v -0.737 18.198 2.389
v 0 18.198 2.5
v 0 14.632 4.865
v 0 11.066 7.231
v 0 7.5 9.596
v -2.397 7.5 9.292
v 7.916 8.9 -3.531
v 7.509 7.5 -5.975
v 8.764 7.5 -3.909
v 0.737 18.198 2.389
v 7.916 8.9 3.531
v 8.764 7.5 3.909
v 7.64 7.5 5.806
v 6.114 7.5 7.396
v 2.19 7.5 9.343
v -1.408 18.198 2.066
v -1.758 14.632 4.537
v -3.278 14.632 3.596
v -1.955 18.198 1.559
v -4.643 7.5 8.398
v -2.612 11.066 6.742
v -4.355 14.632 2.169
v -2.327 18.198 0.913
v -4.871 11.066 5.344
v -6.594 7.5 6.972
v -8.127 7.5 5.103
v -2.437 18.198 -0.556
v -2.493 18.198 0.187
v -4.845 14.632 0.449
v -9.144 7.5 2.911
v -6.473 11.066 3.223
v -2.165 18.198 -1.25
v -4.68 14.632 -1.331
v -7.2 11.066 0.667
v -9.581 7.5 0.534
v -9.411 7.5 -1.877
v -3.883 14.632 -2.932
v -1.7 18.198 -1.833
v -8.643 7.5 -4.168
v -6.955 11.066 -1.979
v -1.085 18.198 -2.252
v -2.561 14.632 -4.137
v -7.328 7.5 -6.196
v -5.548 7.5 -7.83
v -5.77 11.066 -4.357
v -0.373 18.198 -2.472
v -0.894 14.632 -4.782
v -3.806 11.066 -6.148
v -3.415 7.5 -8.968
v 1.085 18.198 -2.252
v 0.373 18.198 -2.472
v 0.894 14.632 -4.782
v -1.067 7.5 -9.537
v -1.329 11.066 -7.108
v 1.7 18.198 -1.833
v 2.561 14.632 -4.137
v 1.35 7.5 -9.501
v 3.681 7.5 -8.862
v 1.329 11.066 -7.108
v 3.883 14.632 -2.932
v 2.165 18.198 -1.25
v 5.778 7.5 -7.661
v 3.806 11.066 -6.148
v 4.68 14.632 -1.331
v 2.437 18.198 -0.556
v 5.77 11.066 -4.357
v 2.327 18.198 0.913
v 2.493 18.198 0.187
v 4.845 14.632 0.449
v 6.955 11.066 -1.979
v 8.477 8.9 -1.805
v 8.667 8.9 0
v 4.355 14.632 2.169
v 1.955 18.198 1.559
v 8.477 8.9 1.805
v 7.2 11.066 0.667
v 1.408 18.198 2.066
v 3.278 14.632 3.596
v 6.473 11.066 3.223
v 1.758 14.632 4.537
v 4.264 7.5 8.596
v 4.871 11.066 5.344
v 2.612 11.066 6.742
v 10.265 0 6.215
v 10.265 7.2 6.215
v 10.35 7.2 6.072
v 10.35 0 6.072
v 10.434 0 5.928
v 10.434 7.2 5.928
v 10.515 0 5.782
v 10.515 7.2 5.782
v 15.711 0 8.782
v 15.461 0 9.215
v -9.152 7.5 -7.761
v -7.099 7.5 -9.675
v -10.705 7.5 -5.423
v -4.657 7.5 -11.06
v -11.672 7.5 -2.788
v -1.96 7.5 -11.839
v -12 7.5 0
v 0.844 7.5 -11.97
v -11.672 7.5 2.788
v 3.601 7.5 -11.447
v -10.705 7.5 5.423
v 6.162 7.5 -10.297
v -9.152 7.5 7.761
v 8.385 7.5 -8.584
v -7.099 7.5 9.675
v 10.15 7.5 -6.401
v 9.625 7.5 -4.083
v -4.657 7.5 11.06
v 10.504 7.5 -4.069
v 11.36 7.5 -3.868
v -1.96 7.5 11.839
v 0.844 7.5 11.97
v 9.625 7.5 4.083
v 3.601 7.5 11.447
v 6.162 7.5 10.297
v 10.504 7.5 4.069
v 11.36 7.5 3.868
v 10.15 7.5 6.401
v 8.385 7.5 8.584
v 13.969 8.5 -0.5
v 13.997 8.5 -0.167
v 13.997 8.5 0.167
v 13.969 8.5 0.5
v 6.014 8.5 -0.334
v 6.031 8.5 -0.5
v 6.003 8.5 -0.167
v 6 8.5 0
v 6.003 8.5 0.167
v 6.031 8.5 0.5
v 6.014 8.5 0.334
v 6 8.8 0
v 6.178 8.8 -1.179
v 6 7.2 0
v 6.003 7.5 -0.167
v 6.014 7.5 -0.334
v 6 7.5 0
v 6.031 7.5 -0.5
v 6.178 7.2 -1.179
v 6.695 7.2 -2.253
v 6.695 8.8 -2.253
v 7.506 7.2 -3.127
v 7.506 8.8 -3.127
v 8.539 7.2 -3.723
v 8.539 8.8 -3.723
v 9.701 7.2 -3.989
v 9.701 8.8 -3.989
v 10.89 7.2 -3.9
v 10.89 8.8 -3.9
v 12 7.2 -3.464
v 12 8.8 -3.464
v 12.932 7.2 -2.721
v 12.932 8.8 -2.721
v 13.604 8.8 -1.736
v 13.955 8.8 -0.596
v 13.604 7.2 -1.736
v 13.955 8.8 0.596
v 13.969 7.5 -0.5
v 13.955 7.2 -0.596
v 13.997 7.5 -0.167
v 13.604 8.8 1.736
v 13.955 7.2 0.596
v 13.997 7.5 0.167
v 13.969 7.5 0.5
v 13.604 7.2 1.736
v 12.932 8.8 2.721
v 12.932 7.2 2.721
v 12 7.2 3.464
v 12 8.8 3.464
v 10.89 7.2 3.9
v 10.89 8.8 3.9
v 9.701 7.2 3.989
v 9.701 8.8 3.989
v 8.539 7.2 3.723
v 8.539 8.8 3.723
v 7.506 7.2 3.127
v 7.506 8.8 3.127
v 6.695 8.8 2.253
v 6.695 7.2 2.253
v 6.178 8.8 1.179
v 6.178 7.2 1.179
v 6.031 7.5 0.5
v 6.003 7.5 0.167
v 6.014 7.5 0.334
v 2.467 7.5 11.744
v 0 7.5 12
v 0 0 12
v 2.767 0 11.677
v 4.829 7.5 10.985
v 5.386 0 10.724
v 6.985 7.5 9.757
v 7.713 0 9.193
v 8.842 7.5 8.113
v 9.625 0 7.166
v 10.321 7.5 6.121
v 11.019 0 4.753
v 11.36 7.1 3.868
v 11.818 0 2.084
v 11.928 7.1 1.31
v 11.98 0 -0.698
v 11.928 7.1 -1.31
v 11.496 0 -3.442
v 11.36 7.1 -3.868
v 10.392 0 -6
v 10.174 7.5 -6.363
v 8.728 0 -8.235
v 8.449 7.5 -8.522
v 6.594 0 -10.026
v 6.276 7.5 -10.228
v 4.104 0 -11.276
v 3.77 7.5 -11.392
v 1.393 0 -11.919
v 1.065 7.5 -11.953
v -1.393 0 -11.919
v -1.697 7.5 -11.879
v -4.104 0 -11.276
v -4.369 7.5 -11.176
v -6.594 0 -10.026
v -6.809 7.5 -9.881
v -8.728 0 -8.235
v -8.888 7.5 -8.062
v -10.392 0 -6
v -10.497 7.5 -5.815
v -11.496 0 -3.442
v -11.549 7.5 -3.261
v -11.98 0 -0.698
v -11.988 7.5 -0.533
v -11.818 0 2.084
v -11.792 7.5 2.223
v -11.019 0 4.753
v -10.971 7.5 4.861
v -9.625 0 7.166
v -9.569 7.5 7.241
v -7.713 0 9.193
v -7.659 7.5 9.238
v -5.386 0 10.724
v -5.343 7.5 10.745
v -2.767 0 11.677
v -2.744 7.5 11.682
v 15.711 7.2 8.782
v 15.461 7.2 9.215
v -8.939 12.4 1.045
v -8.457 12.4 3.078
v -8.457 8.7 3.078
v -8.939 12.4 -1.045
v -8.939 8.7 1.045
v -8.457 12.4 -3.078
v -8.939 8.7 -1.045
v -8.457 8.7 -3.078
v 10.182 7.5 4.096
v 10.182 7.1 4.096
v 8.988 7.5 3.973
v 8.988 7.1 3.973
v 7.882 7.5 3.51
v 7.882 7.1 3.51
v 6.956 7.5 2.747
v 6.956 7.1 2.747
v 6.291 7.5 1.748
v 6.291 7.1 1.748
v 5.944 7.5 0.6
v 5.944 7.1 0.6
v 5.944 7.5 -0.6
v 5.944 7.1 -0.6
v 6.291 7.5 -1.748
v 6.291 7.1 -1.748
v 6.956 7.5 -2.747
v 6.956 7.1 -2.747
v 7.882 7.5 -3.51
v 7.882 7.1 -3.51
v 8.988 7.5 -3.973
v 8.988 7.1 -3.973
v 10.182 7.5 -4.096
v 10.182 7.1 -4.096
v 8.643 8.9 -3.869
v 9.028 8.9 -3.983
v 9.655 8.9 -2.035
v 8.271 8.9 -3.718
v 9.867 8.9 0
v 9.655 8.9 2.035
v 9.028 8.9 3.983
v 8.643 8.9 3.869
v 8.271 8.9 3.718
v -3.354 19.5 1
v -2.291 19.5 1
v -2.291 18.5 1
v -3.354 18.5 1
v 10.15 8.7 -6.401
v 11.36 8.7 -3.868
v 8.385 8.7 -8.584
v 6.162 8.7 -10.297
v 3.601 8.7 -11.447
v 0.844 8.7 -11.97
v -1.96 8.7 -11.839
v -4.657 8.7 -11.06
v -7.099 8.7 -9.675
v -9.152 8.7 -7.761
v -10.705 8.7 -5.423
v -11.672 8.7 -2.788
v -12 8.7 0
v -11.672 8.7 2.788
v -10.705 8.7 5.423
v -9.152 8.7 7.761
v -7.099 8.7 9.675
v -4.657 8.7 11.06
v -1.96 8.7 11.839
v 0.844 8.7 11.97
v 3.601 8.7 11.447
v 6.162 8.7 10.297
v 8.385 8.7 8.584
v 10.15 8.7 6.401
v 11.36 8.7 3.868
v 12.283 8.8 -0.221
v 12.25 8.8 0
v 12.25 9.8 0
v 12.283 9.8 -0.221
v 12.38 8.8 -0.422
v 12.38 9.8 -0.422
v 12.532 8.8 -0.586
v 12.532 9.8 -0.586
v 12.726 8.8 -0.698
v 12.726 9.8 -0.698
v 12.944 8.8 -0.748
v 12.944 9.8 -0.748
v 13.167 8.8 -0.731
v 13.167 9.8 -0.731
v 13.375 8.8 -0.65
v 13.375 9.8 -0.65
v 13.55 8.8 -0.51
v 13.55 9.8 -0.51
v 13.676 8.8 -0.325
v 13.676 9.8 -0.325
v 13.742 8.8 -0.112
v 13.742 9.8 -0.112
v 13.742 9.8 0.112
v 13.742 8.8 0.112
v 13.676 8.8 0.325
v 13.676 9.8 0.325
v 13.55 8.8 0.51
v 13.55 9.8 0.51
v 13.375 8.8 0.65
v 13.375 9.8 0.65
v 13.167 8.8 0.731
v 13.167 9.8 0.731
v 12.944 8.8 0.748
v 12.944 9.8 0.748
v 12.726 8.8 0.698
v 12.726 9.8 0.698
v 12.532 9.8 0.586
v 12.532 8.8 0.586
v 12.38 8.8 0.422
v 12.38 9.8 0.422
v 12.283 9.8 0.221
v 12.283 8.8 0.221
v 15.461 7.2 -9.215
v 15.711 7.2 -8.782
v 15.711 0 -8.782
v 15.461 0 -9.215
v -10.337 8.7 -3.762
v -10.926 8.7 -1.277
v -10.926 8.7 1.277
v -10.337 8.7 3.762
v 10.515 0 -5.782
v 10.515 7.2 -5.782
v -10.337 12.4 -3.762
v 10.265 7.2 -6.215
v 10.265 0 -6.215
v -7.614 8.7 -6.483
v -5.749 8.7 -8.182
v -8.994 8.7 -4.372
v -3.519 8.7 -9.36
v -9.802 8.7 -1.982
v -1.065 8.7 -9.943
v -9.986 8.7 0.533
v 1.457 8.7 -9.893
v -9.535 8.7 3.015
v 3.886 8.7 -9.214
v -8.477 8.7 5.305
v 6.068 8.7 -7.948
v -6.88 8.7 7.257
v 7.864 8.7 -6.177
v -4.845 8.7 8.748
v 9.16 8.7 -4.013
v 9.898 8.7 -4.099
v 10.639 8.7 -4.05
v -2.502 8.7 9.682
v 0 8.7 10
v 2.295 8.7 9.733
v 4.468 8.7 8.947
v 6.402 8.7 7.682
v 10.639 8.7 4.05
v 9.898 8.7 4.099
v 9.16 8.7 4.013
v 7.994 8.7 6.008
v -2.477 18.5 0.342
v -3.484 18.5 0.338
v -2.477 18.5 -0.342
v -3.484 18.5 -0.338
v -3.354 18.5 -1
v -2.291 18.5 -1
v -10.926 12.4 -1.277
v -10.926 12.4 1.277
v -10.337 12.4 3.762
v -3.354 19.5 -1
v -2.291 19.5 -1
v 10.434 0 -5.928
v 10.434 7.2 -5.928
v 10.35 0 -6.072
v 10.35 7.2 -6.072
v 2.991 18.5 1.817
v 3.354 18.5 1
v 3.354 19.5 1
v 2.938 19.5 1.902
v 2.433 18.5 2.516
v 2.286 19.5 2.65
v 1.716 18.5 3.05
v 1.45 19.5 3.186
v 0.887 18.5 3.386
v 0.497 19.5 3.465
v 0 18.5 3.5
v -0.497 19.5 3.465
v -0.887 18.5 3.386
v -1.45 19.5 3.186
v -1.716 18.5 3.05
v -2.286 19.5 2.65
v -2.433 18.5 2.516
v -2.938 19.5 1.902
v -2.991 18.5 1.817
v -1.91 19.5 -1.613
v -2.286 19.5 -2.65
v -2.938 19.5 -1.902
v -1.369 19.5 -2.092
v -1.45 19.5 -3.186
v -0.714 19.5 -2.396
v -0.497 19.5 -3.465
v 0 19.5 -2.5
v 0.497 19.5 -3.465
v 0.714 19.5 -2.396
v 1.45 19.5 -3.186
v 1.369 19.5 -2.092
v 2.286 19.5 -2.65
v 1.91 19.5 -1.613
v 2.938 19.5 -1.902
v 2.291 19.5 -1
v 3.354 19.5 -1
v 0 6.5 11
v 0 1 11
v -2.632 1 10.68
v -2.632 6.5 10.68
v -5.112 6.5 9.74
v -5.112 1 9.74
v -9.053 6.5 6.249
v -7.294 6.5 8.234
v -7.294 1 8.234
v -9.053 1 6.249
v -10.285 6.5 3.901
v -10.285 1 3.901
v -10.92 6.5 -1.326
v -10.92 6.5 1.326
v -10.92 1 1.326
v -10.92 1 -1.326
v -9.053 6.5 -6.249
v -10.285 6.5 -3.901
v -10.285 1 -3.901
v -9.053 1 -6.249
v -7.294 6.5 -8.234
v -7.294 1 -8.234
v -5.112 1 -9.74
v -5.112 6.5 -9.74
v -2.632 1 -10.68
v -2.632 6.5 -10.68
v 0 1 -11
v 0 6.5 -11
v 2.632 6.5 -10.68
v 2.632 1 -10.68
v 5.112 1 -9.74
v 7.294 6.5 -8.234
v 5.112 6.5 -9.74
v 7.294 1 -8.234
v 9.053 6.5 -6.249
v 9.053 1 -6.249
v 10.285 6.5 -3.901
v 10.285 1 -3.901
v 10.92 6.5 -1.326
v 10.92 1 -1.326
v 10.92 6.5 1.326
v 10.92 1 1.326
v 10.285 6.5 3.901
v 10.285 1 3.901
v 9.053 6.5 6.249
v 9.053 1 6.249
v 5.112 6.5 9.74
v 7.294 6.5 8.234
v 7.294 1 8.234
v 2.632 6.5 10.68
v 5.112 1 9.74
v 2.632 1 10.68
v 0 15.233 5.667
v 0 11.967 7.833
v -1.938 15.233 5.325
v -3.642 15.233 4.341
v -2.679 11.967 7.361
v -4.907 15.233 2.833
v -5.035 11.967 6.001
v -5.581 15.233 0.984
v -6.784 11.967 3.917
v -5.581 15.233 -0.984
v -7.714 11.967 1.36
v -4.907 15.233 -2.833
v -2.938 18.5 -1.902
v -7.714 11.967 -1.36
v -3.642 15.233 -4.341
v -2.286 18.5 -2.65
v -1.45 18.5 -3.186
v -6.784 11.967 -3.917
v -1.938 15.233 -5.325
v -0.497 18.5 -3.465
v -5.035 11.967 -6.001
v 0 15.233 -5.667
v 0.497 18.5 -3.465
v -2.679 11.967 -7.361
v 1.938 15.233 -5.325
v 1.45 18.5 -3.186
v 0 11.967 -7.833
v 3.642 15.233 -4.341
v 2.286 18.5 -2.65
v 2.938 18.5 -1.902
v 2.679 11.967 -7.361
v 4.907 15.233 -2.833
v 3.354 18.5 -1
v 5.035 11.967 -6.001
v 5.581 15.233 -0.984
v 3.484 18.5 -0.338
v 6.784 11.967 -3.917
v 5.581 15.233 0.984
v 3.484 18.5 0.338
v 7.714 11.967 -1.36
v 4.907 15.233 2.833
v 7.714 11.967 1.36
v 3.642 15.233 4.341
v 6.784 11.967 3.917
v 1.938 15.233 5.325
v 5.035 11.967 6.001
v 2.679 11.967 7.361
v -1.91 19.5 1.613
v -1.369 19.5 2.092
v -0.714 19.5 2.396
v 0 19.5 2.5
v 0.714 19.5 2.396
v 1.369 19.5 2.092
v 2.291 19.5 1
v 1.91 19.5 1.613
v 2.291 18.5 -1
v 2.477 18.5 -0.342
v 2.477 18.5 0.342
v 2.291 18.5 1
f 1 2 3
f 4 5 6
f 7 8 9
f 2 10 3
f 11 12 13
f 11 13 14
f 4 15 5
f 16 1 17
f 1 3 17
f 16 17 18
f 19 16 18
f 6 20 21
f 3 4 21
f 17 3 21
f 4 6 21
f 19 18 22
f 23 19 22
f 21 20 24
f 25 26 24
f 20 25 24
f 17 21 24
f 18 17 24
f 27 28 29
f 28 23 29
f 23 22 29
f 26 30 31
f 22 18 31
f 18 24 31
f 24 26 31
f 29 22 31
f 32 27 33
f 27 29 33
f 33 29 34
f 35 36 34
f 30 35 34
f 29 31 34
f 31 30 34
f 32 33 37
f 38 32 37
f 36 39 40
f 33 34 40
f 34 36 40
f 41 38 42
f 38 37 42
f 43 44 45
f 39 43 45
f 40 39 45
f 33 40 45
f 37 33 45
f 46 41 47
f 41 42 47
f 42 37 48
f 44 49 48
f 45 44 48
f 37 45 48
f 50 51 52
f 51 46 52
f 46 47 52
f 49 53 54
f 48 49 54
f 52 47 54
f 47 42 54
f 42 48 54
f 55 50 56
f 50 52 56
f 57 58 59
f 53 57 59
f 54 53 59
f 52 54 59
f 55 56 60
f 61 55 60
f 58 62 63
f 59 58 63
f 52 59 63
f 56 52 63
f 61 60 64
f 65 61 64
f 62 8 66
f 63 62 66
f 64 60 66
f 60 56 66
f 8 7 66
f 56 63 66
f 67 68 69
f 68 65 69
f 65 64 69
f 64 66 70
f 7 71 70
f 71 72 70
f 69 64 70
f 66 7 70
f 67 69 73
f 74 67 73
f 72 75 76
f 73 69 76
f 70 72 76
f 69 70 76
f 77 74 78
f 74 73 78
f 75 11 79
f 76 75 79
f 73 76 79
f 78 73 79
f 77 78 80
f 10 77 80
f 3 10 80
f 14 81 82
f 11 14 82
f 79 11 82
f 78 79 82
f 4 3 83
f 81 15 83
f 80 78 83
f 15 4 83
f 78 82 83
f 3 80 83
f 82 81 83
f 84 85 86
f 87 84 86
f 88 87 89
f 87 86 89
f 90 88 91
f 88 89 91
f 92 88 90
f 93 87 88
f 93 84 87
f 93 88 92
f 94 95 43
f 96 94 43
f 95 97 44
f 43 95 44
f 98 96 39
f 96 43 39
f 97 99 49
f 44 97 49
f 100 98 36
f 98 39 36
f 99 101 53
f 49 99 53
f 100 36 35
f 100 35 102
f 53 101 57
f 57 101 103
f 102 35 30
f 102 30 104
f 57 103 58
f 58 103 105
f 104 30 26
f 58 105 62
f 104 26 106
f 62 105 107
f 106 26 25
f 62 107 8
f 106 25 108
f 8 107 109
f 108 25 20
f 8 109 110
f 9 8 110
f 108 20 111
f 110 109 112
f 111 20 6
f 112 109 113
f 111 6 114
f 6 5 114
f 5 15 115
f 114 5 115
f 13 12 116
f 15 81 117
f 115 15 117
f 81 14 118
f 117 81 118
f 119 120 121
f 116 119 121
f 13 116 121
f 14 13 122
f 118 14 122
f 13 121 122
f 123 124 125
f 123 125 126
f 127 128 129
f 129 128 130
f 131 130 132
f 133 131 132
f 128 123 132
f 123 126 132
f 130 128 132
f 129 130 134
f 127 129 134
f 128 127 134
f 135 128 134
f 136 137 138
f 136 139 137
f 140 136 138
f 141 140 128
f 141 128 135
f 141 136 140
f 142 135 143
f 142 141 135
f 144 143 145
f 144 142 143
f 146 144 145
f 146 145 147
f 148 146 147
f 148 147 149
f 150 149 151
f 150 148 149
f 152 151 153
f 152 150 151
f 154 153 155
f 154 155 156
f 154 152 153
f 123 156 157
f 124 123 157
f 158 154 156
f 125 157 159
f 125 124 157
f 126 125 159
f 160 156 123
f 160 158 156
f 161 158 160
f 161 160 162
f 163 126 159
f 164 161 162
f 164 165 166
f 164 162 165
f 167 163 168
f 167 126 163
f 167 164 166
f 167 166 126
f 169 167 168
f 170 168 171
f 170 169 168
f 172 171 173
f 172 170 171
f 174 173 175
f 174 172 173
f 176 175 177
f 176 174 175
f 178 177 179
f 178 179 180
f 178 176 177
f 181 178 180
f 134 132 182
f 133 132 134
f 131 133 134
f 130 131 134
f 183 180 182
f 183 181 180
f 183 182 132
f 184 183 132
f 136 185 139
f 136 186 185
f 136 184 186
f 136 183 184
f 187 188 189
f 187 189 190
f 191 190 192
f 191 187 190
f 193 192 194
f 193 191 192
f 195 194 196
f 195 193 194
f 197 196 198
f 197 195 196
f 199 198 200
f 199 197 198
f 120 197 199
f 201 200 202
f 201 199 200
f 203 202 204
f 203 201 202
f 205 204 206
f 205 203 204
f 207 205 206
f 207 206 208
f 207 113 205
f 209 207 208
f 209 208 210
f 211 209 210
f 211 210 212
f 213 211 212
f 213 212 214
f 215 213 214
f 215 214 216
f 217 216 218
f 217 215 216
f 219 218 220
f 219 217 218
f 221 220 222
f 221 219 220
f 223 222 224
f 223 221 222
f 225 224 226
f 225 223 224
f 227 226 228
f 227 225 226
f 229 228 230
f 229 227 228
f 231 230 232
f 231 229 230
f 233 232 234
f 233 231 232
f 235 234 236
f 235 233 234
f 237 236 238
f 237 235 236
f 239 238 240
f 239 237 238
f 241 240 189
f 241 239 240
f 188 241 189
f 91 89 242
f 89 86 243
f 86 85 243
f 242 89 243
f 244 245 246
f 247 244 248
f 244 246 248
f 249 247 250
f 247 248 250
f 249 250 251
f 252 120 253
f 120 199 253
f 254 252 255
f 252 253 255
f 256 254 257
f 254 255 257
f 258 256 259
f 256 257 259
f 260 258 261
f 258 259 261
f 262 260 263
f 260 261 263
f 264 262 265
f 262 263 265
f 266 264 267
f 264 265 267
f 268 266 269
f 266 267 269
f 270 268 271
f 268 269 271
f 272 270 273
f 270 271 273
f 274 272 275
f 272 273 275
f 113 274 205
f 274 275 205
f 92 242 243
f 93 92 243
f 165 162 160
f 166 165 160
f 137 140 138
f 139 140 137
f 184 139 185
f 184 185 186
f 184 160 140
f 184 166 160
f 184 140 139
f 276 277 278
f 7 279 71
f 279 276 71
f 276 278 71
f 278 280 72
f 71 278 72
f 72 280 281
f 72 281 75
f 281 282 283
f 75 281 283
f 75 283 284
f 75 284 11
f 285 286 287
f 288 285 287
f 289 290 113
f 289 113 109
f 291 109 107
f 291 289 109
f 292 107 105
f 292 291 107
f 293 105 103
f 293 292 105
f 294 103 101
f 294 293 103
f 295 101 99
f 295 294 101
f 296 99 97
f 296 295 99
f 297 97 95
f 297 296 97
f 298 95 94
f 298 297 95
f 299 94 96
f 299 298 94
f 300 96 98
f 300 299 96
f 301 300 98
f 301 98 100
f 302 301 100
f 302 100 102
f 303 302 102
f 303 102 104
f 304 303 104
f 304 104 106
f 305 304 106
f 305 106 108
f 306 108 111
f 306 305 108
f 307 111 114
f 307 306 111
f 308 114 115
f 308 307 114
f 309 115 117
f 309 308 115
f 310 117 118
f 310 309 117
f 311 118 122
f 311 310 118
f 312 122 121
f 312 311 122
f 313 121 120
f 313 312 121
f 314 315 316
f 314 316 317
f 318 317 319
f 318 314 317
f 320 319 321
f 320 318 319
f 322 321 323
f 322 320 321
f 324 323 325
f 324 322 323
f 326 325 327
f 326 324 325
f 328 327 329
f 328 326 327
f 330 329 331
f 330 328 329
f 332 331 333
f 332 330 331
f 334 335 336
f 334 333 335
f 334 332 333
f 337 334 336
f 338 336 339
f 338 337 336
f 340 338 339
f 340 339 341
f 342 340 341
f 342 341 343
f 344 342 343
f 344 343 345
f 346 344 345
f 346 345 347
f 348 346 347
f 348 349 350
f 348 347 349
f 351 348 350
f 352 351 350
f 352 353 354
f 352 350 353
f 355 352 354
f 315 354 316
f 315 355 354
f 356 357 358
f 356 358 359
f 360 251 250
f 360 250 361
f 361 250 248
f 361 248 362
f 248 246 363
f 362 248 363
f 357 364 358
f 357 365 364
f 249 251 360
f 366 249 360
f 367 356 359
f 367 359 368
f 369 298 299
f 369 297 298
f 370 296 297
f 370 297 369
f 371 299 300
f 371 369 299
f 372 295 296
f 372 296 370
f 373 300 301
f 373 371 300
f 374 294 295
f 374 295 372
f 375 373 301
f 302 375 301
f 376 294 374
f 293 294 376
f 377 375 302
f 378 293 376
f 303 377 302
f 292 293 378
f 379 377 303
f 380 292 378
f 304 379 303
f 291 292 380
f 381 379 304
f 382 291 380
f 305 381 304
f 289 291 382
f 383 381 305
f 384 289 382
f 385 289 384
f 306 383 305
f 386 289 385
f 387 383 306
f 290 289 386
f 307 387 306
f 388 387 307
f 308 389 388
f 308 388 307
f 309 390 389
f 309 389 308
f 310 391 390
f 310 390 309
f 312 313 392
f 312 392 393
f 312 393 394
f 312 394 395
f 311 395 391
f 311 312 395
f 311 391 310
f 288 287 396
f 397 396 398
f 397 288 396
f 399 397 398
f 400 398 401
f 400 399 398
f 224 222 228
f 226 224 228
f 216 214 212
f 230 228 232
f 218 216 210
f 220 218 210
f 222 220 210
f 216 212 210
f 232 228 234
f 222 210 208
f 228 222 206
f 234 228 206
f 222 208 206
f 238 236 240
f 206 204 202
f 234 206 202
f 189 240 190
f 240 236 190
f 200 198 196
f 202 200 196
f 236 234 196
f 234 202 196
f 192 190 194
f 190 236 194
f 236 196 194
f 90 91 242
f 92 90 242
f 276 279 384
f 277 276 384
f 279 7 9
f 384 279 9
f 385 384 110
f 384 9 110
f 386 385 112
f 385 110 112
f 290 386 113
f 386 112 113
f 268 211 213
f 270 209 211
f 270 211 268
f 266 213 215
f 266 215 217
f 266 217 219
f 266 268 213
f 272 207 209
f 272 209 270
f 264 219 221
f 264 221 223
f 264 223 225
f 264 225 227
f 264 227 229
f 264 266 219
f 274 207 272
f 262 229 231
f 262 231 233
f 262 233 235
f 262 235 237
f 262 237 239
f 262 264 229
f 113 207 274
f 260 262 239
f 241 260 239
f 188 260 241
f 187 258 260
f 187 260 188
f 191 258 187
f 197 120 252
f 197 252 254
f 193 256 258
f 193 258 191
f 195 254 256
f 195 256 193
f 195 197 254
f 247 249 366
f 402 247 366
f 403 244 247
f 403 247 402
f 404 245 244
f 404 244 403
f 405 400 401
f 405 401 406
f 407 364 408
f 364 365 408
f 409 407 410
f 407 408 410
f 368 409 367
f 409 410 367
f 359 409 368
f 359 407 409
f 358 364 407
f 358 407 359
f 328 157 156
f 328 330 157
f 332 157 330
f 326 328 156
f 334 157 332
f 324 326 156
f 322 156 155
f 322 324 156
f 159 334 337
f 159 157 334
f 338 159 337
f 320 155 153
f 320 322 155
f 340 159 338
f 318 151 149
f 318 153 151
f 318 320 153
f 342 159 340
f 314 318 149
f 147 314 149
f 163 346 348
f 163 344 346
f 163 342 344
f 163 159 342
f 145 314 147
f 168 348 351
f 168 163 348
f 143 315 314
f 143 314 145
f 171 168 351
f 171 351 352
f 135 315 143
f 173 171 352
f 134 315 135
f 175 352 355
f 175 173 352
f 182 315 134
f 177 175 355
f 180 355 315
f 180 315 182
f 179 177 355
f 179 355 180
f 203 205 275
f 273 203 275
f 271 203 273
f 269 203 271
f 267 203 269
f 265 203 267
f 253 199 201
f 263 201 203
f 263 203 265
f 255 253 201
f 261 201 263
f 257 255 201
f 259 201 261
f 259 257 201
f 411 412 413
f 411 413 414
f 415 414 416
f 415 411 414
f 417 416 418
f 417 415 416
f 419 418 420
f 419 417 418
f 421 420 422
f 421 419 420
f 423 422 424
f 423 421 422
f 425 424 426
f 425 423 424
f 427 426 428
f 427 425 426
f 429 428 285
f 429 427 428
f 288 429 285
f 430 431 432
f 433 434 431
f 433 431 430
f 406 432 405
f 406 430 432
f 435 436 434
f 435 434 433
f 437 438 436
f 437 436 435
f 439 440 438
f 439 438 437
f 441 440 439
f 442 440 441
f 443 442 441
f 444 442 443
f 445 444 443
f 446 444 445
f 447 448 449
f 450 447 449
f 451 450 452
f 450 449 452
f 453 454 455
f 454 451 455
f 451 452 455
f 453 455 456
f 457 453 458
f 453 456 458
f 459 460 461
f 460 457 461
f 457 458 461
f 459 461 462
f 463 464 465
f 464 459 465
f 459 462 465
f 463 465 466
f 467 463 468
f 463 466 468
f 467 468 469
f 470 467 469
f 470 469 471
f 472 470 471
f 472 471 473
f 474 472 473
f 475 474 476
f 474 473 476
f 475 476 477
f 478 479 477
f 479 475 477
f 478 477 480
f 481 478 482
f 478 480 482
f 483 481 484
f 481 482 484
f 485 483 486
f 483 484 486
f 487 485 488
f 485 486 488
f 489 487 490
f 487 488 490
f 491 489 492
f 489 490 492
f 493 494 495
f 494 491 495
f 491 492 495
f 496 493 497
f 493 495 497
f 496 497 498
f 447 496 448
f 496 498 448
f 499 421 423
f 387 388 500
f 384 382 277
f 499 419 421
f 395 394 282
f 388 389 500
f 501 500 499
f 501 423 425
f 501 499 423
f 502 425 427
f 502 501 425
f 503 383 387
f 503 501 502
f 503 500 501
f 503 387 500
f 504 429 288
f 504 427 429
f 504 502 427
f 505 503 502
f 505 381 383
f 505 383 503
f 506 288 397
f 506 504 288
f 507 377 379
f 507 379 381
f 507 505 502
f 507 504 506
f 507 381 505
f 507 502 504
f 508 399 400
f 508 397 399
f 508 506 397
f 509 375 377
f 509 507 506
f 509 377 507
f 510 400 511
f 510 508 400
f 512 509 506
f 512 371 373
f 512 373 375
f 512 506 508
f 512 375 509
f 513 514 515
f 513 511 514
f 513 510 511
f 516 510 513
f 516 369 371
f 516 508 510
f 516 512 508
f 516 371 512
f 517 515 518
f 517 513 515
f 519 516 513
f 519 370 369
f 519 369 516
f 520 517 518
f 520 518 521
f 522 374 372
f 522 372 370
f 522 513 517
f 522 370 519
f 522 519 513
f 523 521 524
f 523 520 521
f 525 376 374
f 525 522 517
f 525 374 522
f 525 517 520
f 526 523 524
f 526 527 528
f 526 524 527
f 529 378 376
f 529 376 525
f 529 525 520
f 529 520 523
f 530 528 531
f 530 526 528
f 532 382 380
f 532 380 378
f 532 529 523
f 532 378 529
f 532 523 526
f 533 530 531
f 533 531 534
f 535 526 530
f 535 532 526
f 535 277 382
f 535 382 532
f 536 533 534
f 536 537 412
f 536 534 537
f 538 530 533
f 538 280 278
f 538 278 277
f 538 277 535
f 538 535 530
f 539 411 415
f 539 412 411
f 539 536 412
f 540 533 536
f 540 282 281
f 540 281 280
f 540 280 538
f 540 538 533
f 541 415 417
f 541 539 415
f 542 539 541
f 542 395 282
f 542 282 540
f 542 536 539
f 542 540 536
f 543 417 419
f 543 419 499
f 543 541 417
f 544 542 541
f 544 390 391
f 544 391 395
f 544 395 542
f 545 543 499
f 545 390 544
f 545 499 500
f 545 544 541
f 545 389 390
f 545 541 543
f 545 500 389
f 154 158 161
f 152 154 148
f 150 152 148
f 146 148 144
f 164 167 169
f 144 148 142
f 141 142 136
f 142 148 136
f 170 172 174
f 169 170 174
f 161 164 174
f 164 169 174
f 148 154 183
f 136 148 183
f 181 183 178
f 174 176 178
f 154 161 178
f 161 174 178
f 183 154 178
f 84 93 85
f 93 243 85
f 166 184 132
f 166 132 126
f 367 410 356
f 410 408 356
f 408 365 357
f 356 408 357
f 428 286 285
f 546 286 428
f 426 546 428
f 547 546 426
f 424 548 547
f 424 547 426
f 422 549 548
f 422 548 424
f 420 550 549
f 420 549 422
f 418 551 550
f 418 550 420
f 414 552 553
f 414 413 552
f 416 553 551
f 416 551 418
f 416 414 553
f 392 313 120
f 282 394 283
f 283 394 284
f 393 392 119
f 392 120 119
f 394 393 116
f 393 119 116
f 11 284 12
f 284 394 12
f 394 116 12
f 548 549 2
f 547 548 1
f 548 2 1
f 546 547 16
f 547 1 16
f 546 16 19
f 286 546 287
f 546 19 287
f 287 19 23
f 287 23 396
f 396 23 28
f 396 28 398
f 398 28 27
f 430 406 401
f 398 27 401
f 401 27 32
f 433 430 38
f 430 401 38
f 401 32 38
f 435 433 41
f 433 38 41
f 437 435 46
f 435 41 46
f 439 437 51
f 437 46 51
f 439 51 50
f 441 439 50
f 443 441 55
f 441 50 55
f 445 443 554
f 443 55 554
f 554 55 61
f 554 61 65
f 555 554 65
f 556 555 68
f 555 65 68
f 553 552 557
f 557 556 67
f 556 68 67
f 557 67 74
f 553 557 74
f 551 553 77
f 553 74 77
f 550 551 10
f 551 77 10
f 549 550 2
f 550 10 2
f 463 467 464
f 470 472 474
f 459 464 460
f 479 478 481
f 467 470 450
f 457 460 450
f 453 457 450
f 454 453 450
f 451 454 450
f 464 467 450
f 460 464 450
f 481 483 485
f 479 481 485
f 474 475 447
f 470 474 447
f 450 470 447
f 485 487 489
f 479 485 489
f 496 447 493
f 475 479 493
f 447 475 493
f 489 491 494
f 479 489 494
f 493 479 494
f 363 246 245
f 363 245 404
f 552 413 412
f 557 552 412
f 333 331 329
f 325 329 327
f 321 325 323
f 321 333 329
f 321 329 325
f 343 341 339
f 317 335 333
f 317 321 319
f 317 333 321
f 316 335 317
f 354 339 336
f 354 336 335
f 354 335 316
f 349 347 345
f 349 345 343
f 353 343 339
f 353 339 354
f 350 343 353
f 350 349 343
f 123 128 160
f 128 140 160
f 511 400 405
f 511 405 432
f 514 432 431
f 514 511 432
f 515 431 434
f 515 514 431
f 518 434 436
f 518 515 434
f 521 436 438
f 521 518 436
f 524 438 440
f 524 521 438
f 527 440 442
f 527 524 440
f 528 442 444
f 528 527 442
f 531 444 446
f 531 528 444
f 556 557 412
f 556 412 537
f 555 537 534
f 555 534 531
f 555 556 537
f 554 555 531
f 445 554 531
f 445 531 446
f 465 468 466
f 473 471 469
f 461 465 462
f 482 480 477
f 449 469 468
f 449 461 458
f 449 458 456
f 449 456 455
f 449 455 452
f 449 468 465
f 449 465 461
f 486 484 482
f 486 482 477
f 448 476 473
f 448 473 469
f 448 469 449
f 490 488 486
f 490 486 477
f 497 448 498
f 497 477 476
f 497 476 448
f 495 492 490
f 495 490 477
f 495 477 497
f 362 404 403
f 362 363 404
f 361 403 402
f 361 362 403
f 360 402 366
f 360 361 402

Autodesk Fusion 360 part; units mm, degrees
sketch "Boat silouette" plane through (0, 0, 0) normal (1, 0, 0) x (0, 0, -1)
  line L0 (0, 0) -> (-12, 0)
  line L1 (-12, 0) -> (-12, 8.7)
  line L2 (-12, 8.7) -> (-10, 8.7)
  line L3 (0, 0) -> (0, 1)
  line L4 (0, 1) -> (-11, 1)
  line L5 (-3.5, 19.5) -> (-2.5, 19.5)
  line L6 (-3.5, 19.5) -> (-3.5, 18.5)
  line L7 (-10, 8.7) -> (-3.5, 18.5)
  line L8 (-2.5, 19.5) -> (-2.5, 18.1985)
  line L9 (-2.5, 18.1985) -> (-9.596, 7.5)
  line L10 (-9.596, 7.5) -> (0, 7.5)
  line L11 (0, 7.5) -> (0, 6.5)
  line L12 (0, 6.5) -> (-11, 6.5)
  line L13 (-11, 6.5) -> (-11, 1)
  line L14 (-9.596, 7.5) -> (-12, 7.5)
  dimension "d2" = 12
  dimension "d3" = 8.7
  dimension "d4" = 2
  dimension "d5" = 1
  dimension "d6" = 11
  dimension "d10" = 1
  dimension "d11" = 1
  dimension "d13" = 1
  dimension "d14" = 19.5
  dimension "d15" = 2.5
  dimension "d19" = 1
  dimension "d20" = 1.2
sketch "Tracking cap slot" plane through (0, 0, 0) normal (1, 0, 0) x (0, 0, -1)
  line L0 (1, 19.5) -> (-1, 19.5)
  line L1 (-1, 19.5) -> (-1, 18.5)
  line L2 (-1, 18.5) -> (1, 18.5)
  line L3 (1, 18.5) -> (1, 19.5)
  line L4 (1, 19.5) -> (-1, 18.5) construction
  line L5 (-1, 19.5) -> (1, 18.5) construction
  point P0 (0, 19)
  dimension "d17" = 2
  dimension "d18" = 1
sketch "Single slit hole" plane through (0, 0, 0) normal (1, 0, 0) x (0, 0, -1)
  line L0 (0.25, 8) -> (-0.25, 8)
  line L1 (-0.25, 8) -> (-0.25, 7.5)
  line L2 (-0.25, 7.5) -> (0.25, 7.5)
  line L3 (0.25, 7.5) -> (0.25, 8)
  line L4 (0.25, 8) -> (-0.25, 7.5) construction
  line L5 (-0.25, 8) -> (0.25, 7.5) construction
  point P0 (0, 7.75)
  dimension "d21" = 0.5
  dimension "d22" = 0.5
revolve "Revolve5" add sketch "Boat silouette" angle 360 about axis through (0, 1.75, 0) along (0, 1, 0) contours L0 L1 L3 L4 L10 L11 L12 L13 L14 makes body 1
revolve "Revolve6" add sketch "Boat silouette" angle 360 about axis through (0, 1.75, 0) along (0, 1, 0) separate body contours L1 L2 L5 L6 L7 L8 L9 L14 makes body 2
sketch "Nozzle and fins" plane through (0, 7.5, 0) normal (0, 1, 0) x (-1, 0, 0)
  circle A0 centre (0, 0) radius 12
  circle A1 centre (0, 0) radius 12
  circle A2 centre (0, 0) radius 10
  circle A3 centre (-10, 0) radius 4
  circle A4 centre (-10, 0) radius 4.1
  line L0 (-6.0314, 0.5) -> (-13.9686, 0.5)
  line L1 (-6.0314, -0.5) -> (-13.9686, -0.5)
  line L2 (0, 0) -> (-2.5, 0)
  dimension "d47" = 24
  dimension "d48" = 20
  dimension "d49" = 8
  dimension "d50" = 0.1
  dimension "d51" = 1
extrude "Extrude7" cut sketch "Nozzle and fins" along normal blind 1.4 and the other way blind 0.4 contours A0 A1 A2 A3 A4 | A0 A1 A3 A4 | A0 A1 A2 A3 A4 | A0 A1 A2 A3 L0 | A0 A1 A3 L0 | A2 A3 A4 | A0 A1 A3 L1 | A0 A1 A2 A3 L1 | A0 A1 A2 L0 L1 | A0 A1 A3 L0 L1 | A2 A3 L0 | A2 A3 L1 | A2 A3 L0 L1 bodies 1 2
extrude "Extrude8" add sketch "Nozzle and fins" along normal blind 1.3 and the other way blind 0.3 separate body contours A0 A1 A2 A3 L0 | A0 A1 A3 L0 | A0 A1 A3 L1 | A0 A1 A2 A3 L1 | A0 A1 A2 L0 L1 | A0 A1 A3 L0 L1 | A2 A3 L0 | A2 A3 L1 | A2 A3 L0 L1 makes body 3
extrude "Extrude9" cut sketch "Nozzle and fins" along normal blind 1 contours A0 A1 A2 L0 L1 | A0 A1 A3 L0 L1 | A2 A3 L0 L1 bodies 3
extrude "Extrude10" cut sketch "Tracking cap slot" along normal mid plane 30 bodies 2
sketch "Pin" plane through (0, 8.8, 0) normal (0, 1, 0) x (-1, 0, 0)
  circle A0 centre (-10, 0) radius 4
  circle A1 centre (-10, 0) radius 4
  circle A2 centre (-13, 0) radius 0.75
  dimension "d64" = 1.5
extrude "Extrude11" add sketch "Pin" along normal blind 1 contours A2 bodies 3
sketch "Counterweight" plane through (0, 8.7, 0) normal (0, 1, 0) x (-1, 0, 0)
  arc A0 (-11.3595, -3.868) -> (-9.1595, -4.0129) centre (-10, 0) ccw
  arc A1 (-11.3595, -3.868) -> (-11.3595, 3.868) centre (0, 0) ccw
  arc A2 (-9.1595, 4.0129) -> (-11.3595, 3.868) centre (-10, 0) ccw
  arc A3 (-9.1595, -4.0129) -> (-9.1595, 4.0129) centre (0, 0) ccw
  circle A4 centre (0, 0) radius 10
  circle A5 centre (0, 0) radius 11
  circle A6 centre (0, 0) radius 9
  line L0 (0, 0) -> (11, 0)
  line L1 (0, 0) -> (10.3366, 3.7622)
  line L2 (0, 0) -> (10.3366, -3.7622)
  dimension "d67" = 18
  dimension "d68" = 20
extrude "Extrude12" add sketch "Counterweight" along normal blind 3.7 separate body contours A3 A4 A5 L0 L2 | A3 A4 A6 L0 L2 | A3 A4 A5 L0 L1 | A3 A4 A6 L0 L1 makes body 4
sketch "Fins" plane through (0, 7.2, 0) normal (0, -1, 0) x (1, 0, 0)
  circle A0 centre (0, 0) radius 12
  line L0 (0, 0) -> (3.7136, -2.1441)
  line L1 (0, 0) -> (5.5, 0)
  line L2 (15.7112, -8.7822) -> (15.4612, -9.2152)
  line L3 (15.4612, -9.2152) -> (10.265, -6.2152)
  line L4 (10.515, -5.7822) -> (15.7112, -8.7822)
  line L5 (15.7112, -8.7822) -> (10.265, -6.2152) construction
  line L6 (15.4612, -9.2152) -> (10.515, -5.7822) construction
  line L7 (10.515, 5.7822) -> (15.7112, 8.7822)
  line L8 (15.7112, 8.7822) -> (10.265, 6.2152) construction
  line L9 (15.4612, 9.2152) -> (10.265, 6.2152)
  line L10 (15.7112, 8.7822) -> (15.4612, 9.2152)
  line L11 (15.4612, 9.2152) -> (10.515, 5.7822) construction
  line L12 (0, 0) -> (3.7136, 2.1441)
  point P0 (12.9881, -7.4987)
  point P1 (12.9881, 7.4987)
  dimension "d91" = 24
  dimension "d92" = 30
  dimension "d94" = 0.5
  dimension "d95" = 6
extrude "Extrude17" add sketch "Fins" along normal blind 7.2 separate body contours A0 L7 L9 L10 | A0 L2 L3 L4 makes body 5 at (12.2471, 4.8, -6.7822) makes body 6 at (12.2471, 4.8, 6.7822)
